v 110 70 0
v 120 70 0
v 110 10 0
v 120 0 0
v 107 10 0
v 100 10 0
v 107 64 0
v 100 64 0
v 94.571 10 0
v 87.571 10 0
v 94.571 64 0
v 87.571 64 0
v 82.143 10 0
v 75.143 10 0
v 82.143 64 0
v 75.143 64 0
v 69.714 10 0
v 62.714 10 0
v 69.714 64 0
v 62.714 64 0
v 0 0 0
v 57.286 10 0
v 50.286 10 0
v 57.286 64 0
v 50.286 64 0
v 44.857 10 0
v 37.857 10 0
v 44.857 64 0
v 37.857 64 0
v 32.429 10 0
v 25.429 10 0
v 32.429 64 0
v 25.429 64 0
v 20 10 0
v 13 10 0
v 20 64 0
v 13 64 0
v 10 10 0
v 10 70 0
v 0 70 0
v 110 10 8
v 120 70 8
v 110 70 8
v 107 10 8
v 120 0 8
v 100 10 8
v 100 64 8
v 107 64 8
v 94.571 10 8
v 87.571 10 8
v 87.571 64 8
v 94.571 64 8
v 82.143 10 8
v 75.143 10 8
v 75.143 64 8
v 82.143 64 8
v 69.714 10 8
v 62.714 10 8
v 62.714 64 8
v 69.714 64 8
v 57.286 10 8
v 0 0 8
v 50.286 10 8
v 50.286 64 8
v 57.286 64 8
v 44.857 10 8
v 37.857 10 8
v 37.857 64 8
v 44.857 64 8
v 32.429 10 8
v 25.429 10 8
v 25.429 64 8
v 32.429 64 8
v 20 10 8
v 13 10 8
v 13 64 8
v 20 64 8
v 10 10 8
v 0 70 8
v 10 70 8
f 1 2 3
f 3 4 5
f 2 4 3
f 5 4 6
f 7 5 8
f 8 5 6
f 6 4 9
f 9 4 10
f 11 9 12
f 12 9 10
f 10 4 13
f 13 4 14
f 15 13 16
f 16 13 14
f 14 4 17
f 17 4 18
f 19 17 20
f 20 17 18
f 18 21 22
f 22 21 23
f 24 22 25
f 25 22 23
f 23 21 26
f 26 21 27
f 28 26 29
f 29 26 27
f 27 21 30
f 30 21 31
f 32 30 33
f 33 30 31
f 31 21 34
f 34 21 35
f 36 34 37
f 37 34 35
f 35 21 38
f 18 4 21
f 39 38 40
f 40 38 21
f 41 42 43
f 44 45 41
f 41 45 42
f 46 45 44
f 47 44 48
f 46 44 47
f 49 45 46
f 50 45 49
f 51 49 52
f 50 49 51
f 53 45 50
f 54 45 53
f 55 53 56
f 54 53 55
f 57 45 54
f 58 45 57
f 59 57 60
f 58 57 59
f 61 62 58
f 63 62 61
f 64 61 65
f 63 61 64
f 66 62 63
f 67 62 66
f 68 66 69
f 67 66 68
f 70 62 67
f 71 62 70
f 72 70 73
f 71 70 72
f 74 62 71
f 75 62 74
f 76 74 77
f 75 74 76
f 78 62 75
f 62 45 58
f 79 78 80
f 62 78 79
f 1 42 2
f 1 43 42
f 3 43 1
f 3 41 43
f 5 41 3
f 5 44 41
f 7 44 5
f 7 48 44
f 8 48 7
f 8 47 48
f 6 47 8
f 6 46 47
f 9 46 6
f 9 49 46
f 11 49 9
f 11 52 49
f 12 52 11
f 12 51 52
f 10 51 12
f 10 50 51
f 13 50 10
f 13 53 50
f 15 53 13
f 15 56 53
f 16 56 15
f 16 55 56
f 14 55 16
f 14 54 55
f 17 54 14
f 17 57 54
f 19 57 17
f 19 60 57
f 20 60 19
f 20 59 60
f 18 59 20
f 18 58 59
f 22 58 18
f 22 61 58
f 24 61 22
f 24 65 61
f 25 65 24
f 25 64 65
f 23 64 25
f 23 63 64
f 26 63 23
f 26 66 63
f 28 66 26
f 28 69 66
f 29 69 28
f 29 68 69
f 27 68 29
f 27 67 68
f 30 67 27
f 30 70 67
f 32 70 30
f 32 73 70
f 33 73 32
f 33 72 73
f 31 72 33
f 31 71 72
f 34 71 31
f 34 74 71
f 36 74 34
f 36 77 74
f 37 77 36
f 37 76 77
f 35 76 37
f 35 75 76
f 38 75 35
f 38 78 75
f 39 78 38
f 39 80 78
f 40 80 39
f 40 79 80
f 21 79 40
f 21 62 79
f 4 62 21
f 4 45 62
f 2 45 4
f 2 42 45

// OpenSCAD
$fn = 32;

// ----------------------------------------------------------------------
// Guard grille: 8 slats over a 120 x 70 mm plate
// ----------------------------------------------------------------------

// --- parameters (mm) ---
profile_height = 8;       // extrusion height
profile_points = 40;      // points of the closed outline

profile = [[0, 0], [120, 0], [120, 70], [110, 70], [110, 10], [107, 10], [107, 64], [100, 64], [100, 10], [94.571, 10], [94.571, 64], [87.571, 64], [87.571, 10], [82.143, 10], [82.143, 64], [75.143, 64], [75.143, 10], [69.714, 10], [69.714, 64], [62.714, 64], [62.714, 10], [57.286, 10], [57.286, 64], [50.286, 64], [50.286, 10], [44.857, 10], [44.857, 64], [37.857, 64], [37.857, 10], [32.429, 10], [32.429, 64], [25.429, 64], [25.429, 10], [20, 10], [20, 64], [13, 64], [13, 10], [10, 10], [10, 70], [0, 70]];  // single closed polygon, 40 points, counter clockwise

// --- the one profile operation ---
linear_extrude(height = profile_height) polygon(points = profile);
